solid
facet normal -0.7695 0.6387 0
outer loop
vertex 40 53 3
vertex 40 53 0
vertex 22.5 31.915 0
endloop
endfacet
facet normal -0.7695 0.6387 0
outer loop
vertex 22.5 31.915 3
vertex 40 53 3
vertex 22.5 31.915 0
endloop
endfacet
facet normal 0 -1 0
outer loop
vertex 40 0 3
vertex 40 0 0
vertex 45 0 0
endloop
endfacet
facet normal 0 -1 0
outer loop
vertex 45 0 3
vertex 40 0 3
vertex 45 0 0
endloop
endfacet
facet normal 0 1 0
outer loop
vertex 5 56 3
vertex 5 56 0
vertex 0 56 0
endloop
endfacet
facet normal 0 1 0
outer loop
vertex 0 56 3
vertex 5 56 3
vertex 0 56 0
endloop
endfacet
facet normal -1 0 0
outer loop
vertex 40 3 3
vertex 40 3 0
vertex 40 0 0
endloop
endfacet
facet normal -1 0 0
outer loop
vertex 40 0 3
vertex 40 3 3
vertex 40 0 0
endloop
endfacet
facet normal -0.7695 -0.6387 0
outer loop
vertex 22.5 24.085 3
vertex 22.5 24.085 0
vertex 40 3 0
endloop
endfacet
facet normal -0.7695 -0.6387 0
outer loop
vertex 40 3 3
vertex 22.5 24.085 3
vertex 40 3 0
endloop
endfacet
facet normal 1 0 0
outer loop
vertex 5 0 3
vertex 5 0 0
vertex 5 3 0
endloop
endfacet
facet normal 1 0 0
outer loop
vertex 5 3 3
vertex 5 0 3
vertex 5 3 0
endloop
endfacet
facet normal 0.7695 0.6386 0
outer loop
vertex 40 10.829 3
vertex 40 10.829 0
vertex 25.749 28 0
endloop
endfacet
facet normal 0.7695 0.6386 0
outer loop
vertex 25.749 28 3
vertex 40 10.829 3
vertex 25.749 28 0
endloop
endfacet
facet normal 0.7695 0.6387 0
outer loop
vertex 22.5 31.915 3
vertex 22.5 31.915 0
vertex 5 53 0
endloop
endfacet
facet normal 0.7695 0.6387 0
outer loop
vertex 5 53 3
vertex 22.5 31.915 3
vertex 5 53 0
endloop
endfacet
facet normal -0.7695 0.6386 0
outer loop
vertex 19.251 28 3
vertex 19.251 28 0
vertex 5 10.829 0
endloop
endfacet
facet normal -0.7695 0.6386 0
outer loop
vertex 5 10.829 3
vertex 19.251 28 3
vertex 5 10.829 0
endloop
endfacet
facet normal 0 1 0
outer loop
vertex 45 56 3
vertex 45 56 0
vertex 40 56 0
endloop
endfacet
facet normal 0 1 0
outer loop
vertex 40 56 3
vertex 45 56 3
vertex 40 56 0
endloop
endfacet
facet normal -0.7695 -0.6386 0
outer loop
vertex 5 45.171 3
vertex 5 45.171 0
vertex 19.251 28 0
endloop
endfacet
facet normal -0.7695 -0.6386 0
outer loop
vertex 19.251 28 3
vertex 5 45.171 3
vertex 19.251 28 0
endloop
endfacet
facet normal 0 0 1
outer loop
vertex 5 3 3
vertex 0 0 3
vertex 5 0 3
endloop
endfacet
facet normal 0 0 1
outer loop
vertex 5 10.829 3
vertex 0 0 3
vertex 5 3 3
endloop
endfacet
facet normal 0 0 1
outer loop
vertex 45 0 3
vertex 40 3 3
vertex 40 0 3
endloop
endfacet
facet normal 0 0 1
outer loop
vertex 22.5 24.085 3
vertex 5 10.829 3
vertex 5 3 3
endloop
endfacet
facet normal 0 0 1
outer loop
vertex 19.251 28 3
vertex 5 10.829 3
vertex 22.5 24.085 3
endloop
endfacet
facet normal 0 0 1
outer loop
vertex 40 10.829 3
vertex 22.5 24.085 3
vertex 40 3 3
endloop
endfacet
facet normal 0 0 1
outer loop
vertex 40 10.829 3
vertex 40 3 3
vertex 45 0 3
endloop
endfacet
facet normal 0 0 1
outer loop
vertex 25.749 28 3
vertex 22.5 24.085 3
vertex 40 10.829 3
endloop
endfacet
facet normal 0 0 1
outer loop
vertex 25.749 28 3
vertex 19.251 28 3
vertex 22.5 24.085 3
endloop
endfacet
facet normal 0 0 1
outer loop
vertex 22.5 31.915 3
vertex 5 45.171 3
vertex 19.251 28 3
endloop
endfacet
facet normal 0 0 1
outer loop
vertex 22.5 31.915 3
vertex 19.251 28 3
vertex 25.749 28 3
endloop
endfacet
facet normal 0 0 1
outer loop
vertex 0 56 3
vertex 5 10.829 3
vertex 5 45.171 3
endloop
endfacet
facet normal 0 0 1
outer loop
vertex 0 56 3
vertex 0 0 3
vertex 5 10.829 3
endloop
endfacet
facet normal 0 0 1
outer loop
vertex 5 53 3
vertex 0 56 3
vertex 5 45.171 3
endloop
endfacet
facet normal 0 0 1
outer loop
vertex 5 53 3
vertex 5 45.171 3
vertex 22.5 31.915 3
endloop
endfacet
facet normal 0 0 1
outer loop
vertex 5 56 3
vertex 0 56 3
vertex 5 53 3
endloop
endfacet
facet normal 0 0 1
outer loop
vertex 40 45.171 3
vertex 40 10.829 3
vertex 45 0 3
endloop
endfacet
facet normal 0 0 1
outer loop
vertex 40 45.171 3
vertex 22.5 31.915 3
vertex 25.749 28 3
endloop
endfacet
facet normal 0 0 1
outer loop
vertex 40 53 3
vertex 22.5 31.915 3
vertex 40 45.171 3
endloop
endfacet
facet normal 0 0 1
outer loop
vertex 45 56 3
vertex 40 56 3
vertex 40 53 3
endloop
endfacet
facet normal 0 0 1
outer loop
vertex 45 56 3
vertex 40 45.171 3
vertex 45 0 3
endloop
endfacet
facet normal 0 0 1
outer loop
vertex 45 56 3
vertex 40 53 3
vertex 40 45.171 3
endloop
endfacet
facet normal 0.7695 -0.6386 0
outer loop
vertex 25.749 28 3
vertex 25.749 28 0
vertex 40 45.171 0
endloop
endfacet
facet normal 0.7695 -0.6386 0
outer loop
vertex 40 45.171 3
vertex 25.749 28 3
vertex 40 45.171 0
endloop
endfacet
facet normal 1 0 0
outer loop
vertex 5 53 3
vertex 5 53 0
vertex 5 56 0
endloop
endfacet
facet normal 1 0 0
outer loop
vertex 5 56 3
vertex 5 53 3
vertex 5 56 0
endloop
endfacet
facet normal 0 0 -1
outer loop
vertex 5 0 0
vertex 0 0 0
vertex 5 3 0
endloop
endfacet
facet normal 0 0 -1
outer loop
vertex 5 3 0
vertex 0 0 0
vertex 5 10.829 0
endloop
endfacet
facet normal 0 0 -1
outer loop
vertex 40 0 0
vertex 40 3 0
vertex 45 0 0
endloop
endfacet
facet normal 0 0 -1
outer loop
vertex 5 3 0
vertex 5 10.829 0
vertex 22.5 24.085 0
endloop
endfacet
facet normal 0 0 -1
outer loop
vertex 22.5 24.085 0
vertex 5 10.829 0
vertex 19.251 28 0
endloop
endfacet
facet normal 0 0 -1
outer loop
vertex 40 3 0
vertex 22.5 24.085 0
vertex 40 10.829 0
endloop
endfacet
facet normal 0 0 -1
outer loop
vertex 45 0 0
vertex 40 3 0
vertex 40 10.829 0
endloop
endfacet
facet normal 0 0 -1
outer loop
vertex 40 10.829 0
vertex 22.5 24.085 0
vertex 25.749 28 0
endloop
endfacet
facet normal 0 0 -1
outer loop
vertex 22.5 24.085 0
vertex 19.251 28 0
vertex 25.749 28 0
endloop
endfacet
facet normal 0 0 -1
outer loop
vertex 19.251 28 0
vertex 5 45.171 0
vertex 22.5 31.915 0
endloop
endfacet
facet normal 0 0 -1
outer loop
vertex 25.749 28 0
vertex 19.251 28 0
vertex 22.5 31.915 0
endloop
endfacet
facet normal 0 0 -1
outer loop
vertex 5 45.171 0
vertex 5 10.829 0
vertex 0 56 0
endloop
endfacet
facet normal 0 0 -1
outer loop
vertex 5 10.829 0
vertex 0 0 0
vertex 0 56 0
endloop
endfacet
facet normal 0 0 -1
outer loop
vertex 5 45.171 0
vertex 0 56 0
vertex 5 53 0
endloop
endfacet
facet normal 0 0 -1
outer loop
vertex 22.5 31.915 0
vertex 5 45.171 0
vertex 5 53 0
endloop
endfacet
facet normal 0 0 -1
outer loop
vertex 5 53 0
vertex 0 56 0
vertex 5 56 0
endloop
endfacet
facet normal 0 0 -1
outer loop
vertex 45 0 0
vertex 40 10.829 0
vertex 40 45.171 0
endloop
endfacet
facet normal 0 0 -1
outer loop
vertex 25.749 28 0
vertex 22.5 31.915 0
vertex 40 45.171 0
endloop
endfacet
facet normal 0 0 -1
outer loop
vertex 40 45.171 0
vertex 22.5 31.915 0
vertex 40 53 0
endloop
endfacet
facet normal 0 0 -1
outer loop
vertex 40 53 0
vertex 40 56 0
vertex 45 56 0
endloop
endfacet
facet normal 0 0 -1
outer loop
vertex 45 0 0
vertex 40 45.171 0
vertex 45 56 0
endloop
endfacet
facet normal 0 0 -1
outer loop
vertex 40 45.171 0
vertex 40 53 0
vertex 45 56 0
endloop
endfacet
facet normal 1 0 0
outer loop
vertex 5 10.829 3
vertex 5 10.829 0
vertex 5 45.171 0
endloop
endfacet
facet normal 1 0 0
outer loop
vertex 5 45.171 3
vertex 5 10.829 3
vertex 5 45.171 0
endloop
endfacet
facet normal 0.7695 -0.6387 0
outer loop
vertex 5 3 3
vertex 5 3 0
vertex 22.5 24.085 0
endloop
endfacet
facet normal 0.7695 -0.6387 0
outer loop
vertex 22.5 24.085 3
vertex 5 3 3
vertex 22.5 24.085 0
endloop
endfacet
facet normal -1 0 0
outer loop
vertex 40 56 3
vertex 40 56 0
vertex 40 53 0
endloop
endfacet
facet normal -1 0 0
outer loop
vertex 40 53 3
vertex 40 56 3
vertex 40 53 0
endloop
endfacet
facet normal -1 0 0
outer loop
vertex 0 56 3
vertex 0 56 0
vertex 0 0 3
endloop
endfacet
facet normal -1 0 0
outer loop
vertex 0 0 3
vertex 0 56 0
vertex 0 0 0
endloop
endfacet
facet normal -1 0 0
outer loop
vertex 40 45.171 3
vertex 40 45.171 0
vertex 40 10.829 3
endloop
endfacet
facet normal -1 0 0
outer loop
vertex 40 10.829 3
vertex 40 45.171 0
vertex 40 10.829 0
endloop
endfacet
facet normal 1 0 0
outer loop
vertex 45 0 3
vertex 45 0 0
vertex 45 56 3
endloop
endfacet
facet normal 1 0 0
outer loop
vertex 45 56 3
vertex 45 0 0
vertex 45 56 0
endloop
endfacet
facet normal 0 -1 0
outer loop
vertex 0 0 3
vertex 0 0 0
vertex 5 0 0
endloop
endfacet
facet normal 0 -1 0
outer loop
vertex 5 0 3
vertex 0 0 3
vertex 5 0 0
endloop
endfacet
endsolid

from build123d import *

# Parameters (mm, degrees)
BOSS_EXTRUDE1_DEPTH = 3


with BuildPart() as part:
    # Sketch1 → Boss-Extrude1 (new body)
    with BuildSketch(Plane.XY):
        Polygon((0, 56), (0, 28), (5, 28), (5, 45.17097131), (5, 53), (5, 56), align=None)
        Polygon((5, 53), (5, 45.17097131), (19.251130035, 28), (22.5, 31.914514345), align=None)
        Polygon((0, 28), (0, 0), (5, 0), (5, 3), (5, 10.82902869), (5, 28), align=None)
        Polygon((5, 10.82902869), (5, 3), (22.5, 24.085485655), (19.251130035, 28), align=None)
        Polygon((25.748869965, 28), (19.251130035, 28), (22.5, 24.085485655), align=None)
        Polygon((22.5, 31.914514345), (25.748869965, 28), (40, 45.17097131), (40, 53), align=None)
        Polygon((40, 45.17097131), (40, 28), (45, 28), (45, 56), (40, 56), (40, 53), align=None)
        Polygon((40, 10.82902869), (40, 3), (40, 0), (45, 0), (45, 28), (40, 28), align=None)
        Polygon((25.748869965, 28), (22.5, 24.085485655), (40, 3), (40, 10.82902869), align=None)
        Polygon((22.5, 31.914514345), (19.251130035, 28), (25.748869965, 28), align=None)
    extrude(amount=BOSS_EXTRUDE1_DEPTH)


solid = part.part
